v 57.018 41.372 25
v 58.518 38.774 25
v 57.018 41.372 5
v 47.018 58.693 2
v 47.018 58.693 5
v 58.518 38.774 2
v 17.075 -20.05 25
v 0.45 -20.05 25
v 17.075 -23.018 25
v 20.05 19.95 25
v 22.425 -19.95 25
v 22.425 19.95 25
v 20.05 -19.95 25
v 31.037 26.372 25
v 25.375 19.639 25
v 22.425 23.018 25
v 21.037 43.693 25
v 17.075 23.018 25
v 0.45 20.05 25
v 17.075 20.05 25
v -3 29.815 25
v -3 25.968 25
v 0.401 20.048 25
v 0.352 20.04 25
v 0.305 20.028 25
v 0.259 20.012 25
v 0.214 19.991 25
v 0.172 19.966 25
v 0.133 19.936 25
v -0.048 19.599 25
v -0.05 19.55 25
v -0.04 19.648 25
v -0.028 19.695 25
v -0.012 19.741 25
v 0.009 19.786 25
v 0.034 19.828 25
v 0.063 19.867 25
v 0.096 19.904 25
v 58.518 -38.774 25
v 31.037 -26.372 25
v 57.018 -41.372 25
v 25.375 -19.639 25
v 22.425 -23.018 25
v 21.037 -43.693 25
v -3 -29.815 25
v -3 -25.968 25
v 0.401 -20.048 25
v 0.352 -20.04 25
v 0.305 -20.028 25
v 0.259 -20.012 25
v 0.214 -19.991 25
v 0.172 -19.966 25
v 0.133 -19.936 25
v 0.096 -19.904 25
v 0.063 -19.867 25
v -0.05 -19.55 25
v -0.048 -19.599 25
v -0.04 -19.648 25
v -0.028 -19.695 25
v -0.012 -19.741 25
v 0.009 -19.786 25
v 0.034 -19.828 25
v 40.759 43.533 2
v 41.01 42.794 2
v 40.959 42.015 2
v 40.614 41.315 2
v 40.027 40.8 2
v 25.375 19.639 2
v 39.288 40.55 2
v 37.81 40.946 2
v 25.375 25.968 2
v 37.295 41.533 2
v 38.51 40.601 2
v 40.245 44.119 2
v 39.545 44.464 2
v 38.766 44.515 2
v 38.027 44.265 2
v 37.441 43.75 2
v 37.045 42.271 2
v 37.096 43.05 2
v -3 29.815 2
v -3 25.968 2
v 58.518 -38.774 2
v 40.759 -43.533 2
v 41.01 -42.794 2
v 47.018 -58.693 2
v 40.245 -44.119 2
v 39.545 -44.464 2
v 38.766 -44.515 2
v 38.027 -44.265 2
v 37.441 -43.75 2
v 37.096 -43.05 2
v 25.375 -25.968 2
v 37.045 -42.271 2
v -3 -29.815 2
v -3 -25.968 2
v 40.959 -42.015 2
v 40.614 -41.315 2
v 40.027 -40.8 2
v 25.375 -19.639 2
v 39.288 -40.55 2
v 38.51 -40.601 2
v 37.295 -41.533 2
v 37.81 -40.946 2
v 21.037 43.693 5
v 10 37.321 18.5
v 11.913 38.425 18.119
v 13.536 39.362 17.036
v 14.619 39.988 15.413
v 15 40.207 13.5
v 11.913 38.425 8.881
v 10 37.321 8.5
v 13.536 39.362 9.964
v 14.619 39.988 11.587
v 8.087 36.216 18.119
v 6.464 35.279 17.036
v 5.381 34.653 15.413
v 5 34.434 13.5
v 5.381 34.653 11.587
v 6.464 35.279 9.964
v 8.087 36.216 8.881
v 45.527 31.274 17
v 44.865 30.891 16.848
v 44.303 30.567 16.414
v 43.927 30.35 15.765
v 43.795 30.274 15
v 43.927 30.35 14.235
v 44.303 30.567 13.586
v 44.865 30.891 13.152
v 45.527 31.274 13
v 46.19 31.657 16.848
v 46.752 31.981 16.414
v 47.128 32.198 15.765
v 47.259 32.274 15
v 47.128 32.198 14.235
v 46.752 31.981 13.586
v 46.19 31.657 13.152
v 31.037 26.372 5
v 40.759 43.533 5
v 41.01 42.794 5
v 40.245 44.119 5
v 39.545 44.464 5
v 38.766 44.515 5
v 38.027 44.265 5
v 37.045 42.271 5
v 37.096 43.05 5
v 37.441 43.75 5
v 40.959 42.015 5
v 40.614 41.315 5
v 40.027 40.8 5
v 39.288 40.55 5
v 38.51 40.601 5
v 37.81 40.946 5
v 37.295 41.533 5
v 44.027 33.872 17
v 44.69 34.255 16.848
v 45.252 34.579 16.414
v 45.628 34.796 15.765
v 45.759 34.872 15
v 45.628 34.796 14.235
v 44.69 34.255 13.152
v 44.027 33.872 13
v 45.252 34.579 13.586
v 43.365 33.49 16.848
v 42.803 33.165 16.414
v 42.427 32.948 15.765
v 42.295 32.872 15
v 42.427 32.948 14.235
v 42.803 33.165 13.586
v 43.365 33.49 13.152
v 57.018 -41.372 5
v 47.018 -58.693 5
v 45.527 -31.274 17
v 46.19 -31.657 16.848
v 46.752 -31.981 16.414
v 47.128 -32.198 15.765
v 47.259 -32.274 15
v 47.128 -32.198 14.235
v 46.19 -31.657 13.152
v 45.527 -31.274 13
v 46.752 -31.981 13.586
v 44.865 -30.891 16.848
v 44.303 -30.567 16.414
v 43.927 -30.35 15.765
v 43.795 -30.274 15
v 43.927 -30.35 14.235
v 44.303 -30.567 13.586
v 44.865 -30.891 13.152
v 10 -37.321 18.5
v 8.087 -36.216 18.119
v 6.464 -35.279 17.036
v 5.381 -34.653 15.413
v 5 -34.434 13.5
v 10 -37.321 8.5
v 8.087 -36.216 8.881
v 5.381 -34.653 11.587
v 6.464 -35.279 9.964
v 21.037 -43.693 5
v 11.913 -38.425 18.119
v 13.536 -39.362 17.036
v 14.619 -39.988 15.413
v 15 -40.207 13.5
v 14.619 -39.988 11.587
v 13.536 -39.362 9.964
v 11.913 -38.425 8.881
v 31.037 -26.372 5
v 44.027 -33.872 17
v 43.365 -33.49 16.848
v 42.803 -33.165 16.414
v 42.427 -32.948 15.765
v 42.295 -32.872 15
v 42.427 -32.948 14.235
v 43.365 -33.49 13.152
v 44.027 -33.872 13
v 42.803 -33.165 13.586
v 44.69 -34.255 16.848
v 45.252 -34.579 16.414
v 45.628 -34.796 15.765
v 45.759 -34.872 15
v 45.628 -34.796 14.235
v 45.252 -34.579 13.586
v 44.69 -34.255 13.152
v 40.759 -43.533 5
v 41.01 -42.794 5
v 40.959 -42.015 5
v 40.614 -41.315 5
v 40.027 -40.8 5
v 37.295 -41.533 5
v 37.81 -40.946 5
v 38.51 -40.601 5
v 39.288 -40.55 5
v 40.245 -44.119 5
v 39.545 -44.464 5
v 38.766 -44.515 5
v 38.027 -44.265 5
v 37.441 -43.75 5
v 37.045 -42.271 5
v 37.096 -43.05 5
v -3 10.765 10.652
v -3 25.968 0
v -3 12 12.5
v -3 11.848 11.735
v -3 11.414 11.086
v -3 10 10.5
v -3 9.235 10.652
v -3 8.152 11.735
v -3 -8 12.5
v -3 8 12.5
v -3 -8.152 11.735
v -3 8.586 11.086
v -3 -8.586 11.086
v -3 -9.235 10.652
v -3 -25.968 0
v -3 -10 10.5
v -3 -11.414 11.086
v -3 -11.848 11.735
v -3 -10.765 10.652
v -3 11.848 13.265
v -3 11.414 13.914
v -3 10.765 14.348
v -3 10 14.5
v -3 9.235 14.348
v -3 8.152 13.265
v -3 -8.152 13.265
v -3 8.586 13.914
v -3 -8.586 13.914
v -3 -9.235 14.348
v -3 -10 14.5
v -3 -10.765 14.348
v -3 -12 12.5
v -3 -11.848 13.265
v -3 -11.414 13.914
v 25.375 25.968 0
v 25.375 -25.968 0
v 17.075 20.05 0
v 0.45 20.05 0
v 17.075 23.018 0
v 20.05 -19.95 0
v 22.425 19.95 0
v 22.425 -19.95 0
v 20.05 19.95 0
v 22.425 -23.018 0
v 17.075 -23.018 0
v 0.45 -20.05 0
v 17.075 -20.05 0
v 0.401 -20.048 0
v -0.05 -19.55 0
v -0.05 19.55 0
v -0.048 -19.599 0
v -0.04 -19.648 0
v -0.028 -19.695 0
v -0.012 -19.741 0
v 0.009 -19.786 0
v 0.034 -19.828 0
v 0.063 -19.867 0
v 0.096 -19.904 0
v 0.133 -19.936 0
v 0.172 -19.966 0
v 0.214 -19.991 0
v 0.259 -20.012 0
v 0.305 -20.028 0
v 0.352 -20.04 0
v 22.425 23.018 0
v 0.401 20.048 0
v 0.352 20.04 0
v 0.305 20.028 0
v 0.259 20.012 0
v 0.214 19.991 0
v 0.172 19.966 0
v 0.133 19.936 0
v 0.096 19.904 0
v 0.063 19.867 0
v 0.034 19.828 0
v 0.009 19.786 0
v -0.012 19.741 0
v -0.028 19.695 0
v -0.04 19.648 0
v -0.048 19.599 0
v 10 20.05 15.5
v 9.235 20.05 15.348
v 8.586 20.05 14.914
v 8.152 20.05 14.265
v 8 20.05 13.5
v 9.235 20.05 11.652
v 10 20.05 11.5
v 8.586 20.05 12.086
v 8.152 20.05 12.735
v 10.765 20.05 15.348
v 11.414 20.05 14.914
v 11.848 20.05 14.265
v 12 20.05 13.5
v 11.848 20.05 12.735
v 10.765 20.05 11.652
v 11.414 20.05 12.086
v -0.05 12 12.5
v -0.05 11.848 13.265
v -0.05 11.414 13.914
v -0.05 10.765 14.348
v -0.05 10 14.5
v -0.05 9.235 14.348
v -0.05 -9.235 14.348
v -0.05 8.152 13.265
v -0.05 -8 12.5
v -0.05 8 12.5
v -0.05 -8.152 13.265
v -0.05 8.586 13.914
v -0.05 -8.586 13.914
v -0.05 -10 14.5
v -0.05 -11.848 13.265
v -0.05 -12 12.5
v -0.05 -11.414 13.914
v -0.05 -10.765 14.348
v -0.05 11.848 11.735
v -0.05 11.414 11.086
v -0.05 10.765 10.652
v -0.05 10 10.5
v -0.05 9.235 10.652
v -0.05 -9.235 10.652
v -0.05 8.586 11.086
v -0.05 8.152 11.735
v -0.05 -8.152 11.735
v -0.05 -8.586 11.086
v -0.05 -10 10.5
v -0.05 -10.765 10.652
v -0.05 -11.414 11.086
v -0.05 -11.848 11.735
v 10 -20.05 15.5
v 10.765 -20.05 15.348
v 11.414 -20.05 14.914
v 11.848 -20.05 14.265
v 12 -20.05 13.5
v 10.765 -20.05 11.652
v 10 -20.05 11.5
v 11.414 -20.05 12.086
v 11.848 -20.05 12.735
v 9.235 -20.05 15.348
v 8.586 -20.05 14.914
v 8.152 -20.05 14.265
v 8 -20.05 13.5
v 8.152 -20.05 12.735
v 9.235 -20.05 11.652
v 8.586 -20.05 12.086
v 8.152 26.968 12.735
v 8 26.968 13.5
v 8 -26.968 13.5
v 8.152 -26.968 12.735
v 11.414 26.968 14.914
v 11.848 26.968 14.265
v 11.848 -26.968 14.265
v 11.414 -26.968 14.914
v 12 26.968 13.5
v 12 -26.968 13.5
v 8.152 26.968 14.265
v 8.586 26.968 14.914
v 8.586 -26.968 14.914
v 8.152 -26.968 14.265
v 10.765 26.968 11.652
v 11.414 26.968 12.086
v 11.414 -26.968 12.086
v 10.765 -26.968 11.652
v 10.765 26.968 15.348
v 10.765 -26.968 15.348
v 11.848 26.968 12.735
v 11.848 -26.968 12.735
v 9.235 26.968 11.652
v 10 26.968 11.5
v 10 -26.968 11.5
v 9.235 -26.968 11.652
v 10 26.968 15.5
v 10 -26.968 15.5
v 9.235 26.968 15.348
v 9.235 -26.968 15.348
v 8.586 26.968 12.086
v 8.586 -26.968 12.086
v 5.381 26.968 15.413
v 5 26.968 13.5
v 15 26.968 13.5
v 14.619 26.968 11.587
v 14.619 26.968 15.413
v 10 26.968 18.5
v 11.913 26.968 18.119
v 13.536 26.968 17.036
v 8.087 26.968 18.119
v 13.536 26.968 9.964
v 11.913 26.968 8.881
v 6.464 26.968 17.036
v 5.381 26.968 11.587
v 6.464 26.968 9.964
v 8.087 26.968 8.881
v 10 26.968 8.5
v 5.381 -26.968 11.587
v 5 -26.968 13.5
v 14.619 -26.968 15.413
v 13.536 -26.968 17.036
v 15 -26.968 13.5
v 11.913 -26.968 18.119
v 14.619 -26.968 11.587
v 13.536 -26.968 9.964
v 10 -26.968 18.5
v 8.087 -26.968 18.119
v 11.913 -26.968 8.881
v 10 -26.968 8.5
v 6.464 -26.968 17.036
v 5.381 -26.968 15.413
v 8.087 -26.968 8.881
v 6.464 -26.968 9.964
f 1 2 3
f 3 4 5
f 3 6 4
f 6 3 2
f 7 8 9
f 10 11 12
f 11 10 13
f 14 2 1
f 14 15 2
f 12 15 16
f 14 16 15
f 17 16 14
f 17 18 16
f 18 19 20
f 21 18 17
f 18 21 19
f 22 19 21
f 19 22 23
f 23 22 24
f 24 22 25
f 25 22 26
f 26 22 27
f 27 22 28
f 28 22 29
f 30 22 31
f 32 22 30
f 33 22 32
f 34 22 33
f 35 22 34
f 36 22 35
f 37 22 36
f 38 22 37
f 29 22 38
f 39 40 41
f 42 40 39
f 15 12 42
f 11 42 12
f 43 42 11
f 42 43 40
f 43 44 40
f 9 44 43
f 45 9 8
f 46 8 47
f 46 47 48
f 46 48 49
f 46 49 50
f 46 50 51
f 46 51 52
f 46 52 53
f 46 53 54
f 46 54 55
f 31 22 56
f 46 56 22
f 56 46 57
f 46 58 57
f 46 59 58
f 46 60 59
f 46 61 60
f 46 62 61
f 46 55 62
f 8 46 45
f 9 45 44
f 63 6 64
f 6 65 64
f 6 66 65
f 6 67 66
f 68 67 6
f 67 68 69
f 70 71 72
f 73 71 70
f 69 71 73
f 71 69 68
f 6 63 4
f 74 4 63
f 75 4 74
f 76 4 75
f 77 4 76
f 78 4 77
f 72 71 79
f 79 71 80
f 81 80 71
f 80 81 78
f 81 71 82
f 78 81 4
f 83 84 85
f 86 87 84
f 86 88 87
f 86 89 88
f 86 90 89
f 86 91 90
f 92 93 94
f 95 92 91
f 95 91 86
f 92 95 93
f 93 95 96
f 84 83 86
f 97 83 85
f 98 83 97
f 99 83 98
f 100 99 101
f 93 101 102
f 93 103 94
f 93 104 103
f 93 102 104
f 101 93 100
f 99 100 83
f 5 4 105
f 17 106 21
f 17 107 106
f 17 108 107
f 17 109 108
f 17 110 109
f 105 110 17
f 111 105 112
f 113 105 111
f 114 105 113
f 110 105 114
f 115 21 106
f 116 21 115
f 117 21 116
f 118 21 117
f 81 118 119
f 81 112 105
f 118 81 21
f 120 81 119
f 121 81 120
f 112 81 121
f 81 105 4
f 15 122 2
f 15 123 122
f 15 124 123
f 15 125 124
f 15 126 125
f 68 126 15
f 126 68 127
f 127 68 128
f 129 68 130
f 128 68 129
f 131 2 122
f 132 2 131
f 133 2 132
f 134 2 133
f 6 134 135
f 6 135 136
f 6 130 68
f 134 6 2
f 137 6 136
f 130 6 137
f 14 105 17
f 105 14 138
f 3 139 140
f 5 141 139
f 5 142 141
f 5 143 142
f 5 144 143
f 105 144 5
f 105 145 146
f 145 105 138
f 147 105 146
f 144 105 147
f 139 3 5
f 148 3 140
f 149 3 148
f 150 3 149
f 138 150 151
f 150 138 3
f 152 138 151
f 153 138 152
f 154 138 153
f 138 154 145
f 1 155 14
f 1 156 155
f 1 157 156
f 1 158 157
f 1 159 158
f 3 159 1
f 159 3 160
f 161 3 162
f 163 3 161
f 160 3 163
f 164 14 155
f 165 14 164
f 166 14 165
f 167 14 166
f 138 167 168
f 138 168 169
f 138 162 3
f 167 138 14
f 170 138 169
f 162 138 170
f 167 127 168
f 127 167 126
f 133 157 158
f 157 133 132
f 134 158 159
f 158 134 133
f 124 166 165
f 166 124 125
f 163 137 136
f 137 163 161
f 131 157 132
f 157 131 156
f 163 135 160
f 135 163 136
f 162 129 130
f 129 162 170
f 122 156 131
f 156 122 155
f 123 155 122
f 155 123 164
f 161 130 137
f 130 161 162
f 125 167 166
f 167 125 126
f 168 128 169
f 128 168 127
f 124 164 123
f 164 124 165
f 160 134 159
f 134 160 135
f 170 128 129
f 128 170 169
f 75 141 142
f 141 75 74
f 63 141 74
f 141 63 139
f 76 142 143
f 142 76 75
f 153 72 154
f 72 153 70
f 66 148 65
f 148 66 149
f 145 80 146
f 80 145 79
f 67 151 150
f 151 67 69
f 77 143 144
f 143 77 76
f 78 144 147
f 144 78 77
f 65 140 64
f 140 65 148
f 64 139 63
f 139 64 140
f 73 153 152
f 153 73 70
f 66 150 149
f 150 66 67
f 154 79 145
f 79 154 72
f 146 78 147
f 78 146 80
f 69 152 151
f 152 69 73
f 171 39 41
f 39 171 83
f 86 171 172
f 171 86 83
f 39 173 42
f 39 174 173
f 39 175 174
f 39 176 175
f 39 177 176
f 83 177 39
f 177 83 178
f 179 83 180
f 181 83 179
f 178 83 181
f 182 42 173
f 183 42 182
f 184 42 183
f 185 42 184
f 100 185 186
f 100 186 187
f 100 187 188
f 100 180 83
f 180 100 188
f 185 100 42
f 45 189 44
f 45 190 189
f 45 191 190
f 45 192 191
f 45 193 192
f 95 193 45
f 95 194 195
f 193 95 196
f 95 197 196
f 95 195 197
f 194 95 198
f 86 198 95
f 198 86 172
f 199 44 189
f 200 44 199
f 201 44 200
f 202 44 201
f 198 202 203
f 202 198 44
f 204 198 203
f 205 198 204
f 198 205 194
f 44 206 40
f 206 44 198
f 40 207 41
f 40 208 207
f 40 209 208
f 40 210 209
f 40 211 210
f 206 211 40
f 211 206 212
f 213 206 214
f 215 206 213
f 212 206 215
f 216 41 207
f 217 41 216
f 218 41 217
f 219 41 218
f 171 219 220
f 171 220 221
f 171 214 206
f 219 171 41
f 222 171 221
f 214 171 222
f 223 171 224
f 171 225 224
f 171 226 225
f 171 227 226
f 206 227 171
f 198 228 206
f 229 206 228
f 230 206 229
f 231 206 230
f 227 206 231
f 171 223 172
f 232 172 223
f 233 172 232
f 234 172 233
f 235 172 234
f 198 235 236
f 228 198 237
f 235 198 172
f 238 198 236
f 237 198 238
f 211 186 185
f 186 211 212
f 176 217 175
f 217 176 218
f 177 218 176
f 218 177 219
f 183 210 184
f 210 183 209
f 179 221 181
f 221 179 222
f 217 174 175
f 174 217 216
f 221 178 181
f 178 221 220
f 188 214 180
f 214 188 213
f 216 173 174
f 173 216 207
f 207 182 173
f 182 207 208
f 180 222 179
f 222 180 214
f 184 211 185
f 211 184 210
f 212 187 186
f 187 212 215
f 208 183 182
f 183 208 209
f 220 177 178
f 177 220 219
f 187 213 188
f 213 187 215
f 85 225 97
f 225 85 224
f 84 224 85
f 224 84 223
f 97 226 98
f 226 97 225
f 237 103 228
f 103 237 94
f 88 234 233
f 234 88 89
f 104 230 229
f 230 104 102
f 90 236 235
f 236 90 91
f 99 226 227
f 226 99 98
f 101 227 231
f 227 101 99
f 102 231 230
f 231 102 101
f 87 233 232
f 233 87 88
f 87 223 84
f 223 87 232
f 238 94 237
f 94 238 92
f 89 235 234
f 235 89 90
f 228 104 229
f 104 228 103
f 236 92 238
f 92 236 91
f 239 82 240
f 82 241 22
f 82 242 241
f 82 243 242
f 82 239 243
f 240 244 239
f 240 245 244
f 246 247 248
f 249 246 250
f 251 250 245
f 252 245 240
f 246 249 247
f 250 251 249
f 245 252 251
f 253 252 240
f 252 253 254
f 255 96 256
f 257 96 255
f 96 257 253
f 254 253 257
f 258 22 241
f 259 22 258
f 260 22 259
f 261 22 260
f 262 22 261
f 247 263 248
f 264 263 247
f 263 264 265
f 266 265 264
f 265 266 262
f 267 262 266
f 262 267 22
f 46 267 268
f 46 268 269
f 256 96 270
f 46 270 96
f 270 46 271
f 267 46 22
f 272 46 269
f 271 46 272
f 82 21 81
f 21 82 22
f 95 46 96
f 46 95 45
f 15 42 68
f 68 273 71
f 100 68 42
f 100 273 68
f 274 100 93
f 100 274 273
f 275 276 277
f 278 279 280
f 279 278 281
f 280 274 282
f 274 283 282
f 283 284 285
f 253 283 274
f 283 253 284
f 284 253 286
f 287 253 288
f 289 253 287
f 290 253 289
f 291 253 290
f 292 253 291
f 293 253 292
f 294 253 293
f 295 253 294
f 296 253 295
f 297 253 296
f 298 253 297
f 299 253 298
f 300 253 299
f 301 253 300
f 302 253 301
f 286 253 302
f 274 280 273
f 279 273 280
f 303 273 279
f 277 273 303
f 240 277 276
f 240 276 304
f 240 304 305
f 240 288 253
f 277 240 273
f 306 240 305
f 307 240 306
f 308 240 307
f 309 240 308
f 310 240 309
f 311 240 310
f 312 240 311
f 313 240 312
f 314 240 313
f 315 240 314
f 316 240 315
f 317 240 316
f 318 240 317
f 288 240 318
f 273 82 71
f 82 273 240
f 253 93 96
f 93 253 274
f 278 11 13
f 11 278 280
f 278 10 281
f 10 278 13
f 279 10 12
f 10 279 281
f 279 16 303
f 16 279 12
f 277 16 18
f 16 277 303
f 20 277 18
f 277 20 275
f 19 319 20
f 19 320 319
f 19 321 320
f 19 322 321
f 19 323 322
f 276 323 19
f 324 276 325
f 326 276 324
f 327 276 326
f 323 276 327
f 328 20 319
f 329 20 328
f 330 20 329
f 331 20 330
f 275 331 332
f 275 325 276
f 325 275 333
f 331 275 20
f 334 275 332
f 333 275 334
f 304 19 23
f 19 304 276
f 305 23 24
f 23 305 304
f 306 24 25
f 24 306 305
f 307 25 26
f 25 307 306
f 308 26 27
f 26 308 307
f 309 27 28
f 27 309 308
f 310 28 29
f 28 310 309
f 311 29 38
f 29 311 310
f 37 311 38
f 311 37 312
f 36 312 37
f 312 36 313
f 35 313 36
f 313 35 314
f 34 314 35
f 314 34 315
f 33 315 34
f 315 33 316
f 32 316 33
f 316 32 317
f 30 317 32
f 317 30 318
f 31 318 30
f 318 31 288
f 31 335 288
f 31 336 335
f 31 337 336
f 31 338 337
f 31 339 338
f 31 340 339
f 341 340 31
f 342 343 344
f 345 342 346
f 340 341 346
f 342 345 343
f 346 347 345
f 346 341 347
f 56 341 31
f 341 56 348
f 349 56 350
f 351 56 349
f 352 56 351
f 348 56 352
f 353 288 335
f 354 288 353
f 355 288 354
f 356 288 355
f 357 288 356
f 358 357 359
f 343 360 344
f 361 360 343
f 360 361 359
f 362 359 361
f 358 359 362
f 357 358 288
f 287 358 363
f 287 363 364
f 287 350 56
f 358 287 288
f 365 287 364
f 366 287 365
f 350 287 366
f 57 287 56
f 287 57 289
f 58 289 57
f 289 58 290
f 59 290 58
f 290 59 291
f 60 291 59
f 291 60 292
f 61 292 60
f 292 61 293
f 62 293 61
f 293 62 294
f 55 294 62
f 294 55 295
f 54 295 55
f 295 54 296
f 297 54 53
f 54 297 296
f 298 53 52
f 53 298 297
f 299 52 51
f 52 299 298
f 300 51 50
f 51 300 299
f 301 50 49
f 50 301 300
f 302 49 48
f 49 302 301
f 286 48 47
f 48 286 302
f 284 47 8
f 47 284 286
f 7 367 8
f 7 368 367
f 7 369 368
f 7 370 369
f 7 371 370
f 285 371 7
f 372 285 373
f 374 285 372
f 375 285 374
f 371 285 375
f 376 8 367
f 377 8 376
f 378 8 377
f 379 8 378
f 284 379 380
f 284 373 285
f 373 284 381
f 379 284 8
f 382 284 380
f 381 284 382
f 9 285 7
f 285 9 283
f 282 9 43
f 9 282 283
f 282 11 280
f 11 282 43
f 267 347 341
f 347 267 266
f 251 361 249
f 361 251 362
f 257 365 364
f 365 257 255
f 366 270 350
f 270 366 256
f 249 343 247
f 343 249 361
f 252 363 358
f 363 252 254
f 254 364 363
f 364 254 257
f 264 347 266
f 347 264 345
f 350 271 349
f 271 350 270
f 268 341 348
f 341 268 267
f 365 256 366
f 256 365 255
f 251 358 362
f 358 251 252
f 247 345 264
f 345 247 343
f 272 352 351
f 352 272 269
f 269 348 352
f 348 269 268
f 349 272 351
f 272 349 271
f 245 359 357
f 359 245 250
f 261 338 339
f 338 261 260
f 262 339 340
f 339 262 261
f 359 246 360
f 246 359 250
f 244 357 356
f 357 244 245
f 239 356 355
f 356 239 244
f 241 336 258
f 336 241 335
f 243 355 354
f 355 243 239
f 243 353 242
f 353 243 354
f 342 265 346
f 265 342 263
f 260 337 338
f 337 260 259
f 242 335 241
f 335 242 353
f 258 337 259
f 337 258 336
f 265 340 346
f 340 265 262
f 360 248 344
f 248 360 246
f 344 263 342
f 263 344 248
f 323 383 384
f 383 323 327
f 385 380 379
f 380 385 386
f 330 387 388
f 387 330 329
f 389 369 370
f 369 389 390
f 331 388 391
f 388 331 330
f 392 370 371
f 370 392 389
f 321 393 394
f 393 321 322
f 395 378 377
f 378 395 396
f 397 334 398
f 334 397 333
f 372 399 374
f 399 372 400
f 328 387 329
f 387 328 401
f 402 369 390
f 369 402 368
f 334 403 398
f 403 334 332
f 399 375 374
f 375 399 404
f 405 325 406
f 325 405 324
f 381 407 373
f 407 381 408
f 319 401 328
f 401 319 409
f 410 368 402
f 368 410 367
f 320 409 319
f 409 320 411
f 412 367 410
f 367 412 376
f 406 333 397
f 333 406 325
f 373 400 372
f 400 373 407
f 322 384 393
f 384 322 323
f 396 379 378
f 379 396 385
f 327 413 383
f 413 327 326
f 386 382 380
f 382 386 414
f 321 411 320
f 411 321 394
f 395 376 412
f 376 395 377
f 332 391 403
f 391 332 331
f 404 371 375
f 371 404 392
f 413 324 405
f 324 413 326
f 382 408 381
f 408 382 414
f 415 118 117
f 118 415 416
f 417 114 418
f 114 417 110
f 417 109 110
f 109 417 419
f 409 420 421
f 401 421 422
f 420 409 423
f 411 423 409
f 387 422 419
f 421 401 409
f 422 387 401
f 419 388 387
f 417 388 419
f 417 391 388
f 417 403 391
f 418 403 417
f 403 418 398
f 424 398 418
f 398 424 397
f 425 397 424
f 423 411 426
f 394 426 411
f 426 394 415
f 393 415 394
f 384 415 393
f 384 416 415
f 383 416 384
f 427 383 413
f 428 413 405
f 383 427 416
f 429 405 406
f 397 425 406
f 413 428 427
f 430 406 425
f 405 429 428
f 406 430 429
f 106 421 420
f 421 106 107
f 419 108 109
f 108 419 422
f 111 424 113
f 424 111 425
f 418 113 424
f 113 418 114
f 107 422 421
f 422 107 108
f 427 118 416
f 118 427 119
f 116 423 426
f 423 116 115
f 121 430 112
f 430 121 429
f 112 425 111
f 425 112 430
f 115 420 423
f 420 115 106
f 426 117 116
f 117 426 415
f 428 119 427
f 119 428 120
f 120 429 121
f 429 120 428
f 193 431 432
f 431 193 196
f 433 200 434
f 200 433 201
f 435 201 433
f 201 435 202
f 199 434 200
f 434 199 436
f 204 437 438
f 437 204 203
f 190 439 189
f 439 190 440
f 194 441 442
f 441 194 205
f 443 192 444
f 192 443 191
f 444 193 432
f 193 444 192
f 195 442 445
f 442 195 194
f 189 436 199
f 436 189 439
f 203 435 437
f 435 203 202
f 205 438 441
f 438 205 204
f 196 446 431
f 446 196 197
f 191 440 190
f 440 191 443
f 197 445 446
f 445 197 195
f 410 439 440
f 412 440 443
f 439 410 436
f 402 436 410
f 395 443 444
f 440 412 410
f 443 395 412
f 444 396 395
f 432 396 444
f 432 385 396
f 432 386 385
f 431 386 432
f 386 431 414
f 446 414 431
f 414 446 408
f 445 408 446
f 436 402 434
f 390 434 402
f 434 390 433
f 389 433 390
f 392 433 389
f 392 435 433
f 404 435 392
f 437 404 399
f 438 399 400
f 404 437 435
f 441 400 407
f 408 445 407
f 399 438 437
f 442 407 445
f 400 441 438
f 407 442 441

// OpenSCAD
// file: ../../conf/printer_config.scad
/**********************************************************************************************************************
 **
 ** conf/printer_config.scad
 **
 ** This file contains the main control variables that determine the size and shape of the printer. Note that in the
 ** actual parts specifications, the constants defined here will only ever be accessed through functions defined in
 ** conf/derived_sizes.scad exclusively to allow for easier adaptation, should the mode of calculation change. 
 **
 ** All sizes in mm. Caution: Little to no cross-checking is implemented. Change values sensibly and one at a time.
 **
 ** This file is NOT to be included by any other file except for conf/derived_sizes.scad.
 **
 **********************************************************************************************************************/

include <constants.scad>

// ===== PRINTER CONFIGURATION ========================================================================================

// The length of the vertical MakerSlide extrusions that make up the rails for the carriages.
FRAME_V_RAIL_HEIGHT = 800;

// The length of the horizontal 20x20 V-Slot extrusions that form the sides of the triangle.
FRAME_H_RAIL_LENGTH = 400;

// ===== FABRICATED PART DIMENSIONS ===================================================================================

// The additional clearance to leave around the MakerSlide extrusion.
MAKERSLIDE_CLEARANCE = 0.05;

// The thickness of the walls outside the extruded parts.
FRAME_PART_WALL_THICKNESS = 3;

// The thickness of the wall that separates the vertical rails from the horizontal extrusions.
FRAME_V_H_RAIL_SEPARATION = 8;

// The depth of the holes that hold the V-Slot extrusions.
FRAME_PART_VSLOT_DEPTH = 30;

// Whether to use a horizontal rail at the base of the printer or not.
FRAME_HORIZONTAL_BASE_RAIL = false;

// The depth of the holes in the foot that hold the MakerSlide extrusions. This is for the foot version that holds
// a horizontal rail.
FRAME_FOOT_RAIL_MAKERSLIDE_DEPTH = 25; 

// The depth of the holes in the foot that hold the MakerSlide extrusions. This is for the foot version that does not
// hold a horizontal rail.
FRAME_FOOT_NORAIL_MAKERSLIDE_DEPTH = 17.5; 

// The size of the screws that can be used to mount the foot to the underlying surface.
FRAME_FOOT_BOTTOM_SCREW_SIZE = M5;

// The height of the bracket that holds the motor. WARNING: Increasing this might make it difficult to 
// turn the screws that hold the motor.
FRAME_MOTOR_BRACKET_HEIGHT = 25;

// The height of the bracket that holds the intermediate level with the working surface (print bed).
FRAME_BED_BRACKET_HEIGHT = 25; 

// The depth of the holes in the head that hold the MakerSlide extrusions.
FRAME_HEAD_MAKERSLIDE_DEPTH = 35; 

// The thickness of the carriage base plate. A thicker plate will make the carriage stiffer, but cost more
// material to print and take away space from the working area.
CARRIAGE_PLATE_THICKNESS = 6;

// The width of the border around the holes in the carriage base plate that hold the V-Wheels. 
CARRIAGE_PLATE_BORDER_WIDTH = 8;

// The range by which the vertical belt tensioner can be adjusted.
TENSIONER_RANGE = 15;

// The distance between the rods that hold the effector.
ROD_DISTANCE = 65;

// The outer diameter of the rods.
ROD_OUTER_DIAMETER = 6;

// The inner diameter of the rods. Set to 0 if the rods are not hollow.
ROD_INNER_DIAMETER = 4;

// The additional clearance to leave between the rod and the holder.
ROD_CLEARANCE = 0.05;

// The thickness of the outer wall around the rod.
ROD_HOLDER_WALL_THICKNESS = 2;

// The depth of the insets that hold the rods.
ROD_HOLDER_DEPTH = 10;

// The minimum angle of the arms.
ROD_MIN_ANGLE = 18;

// The factor used to round up the rod length.
ROD_ROUND_UP_TO = 5;

// The thickness of the magnet holder arms.
MAGNET_HOLDER_THICKNESS = 5;

// The additional clearance to leave around the magnet holder pin.
MAGNET_CLEARANCE = 0.025;

// The upward angle of the ball holder on the carriage.
CARRIAGE_BALL_HOLDER_ANGLE = 10;

// The additional distance between the magnets on the effector (not the rod distance - the other one :-)).
// This value is added to the minimum distance determined by the magnet size and wall thickness.
EFFECTOR_BALL_ADDITIONAL_DISTANCE = 15;

// The thickness of the effector plate.
EFFECTOR_THICKNESS = 6;

// The thickness of the plate that serves as the heated bed.
BED_THICKNESS = 4;

// The diameter of the plate that serves as the heated bed.
BED_DIAMETER = 300;
// file: ../../conf/constants.scad
/**********************************************************************************************************************
 **
 ** conf/constants.scad
 **
 ** This file contains constants and aliases used for the part size definitions.
 **
 **********************************************************************************************************************/

/**
 * The alias names for the rails.
 * A is the "front left" rail, B the "front right" rail, C the back rail.
 * These constants are also used for the sides of the frame and the effector; in this case, side A is the one 
 * opposing rail A.
 */
A = 0;
B = 1;
C = 2;

/**
 * Aliases for metric screw/nut sizes.
 */
M2 = 2;
M3 = 3;
M4 = 4;
M5 = 5;

/** 
 * Aliases for NEMA stepper motors.
 */
NEMA14 = 14;
NEMA17 = 17;
NEMA23 = 23;
// file: ../extrusions/vslot_2020.scad
/**********************************************************************************************************************
 **
 ** parts/extrusions/vslot_2020.scad
 **
 ** This file ontains some general functions that provide the dimensions of the profile as well as the modules used 
 ** to import the rendered rails. 
 ** This file is intended to be included by other files down the line.
 **
 **********************************************************************************************************************/

include <../../conf/colors.scad>
include <../../conf/derived_sizes.scad>
include <../../conf/part_sizes.scad>

use <../../bom/bom.scad>

/**
 * Provides the pre-rendered horizontal side piece.
 * The extrusion will lie horizontally along the positive X axis and will extend into positve Y and Z.
 */
module vslot_2020_side() {
	bom_entry(section = "Aluminium Extrusions", description = "V-Slot Extrusion", size = str(horizontal_extrusion_length(), "x20x20 mm"));
	color_extrusion()
		import(file = "vslot_2020_side.stl"); 
}

/**
 * Create an object that resembles the outer shell of a V-Slot 20x20 mm extrusion. Usage is similar
 * to vslot_extrusion(length). This is handy to punch a hole into a printed part that will later
 * accomodate the V-Slot 20x20 mm extrusion.
 */
module vslot_2020_punch(length, rounded = false) {
	color_punch()
		linear_extrude(height = length, center = false, convexity = 10)
			if (rounded) {
				hull($fn = vslot_2020_edge_resolution()) {
					translate([vslot_2020_edge_radius(), vslot_2020_edge_radius(), 0])
						circle(r = vslot_2020_edge_radius());
					translate([vslot_2020_depth() - vslot_2020_edge_radius(), vslot_2020_edge_radius(), 0])
						circle(r = vslot_2020_edge_radius());
					translate([vslot_2020_edge_radius(), 18.5, 0])
						circle(r = vslot_2020_edge_radius());
					translate([vslot_2020_depth() - vslot_2020_edge_radius(), vslot_2020_width() - vslot_2020_edge_radius(), 0])
						circle(r = vslot_2020_edge_radius());
				}
			} else {
				square([vslot_2020_depth(), vslot_2020_width()]);
			}
}
// file: ../extrusions/makerslide.scad
/**********************************************************************************************************************
 **
 ** parts/extrusions/makerslide.scad
 **
 ** This file ontains some general functions that provide the dimensions of the profile as well as the modules used 
 ** to import the rendered rails. 
 ** This file is intended to be included by other files down the line.
 **
 **********************************************************************************************************************/

include <../../conf/colors.scad>
include <../../conf/derived_sizes.scad>
include <../../conf/part_sizes.scad>

use <../../bom/bom.scad>

/**
 * Provides the pre-rendered main vertical rail.
 * The extrusion will reach into positive X and Z space while being centered on the Y axis.
 */
module makerslide_vertical_rail() {
	bom_entry(section = "Aluminium Extrusions", 
		      description = "MakerSlide Extrusion", 
		      size = str(vertical_extrusion_length(), " mm"));
	color_extrusion()
		import(file = "makerslide_rail.stl"); 
}

/**
 * Create an object that resembles the outer shell of a MakerSlide extrusion. Usage is similar
 * to makerslide_vertical_rail(length). This is handy to punch a hole into a printed part that will later
 * accomodate the MakerSlide extrusion.
 */
module makerslide_punch(length) {
	color_punch()
		linear_extrude(height = length, center = false, convexity = 10)
			union() {
				hull() {
					// use two circles for the back sides
					_y_offset = makerslide_base_width()/2 - makerslide_edge_radius() + makerslide_clearance();
					translate([makerslide_edge_radius() - makerslide_clearance(), -_y_offset, 0])
						circle(r = makerslide_edge_radius(), $fn = makerslide_edge_resolution());
					translate([makerslide_edge_radius() - makerslide_clearance(), _y_offset, 0])
						circle(r = makerslide_edge_radius(), $fn = makerslide_edge_resolution());
					// use a rectangle to shape the front side
					translate([makerslide_base_depth() - 1 + makerslide_clearance(), 
						       -makerslide_base_width()/2 - makerslide_clearance(), 0])
						square([1, makerslide_base_width() + 2 * makerslide_clearance()]);
				}
				_rail_base_x = makerslide_base_depth() - makerslide_edge_radius() - 
				               makerslide_rail_depth() - makerslide_clearance();
				_rail_offset_y = makerslide_base_width()/2 - makerslide_clearance();
				_rail_punch_width = makerslide_rail_width() + 2 * makerslide_clearance();
				_rail_punch_depth = 2*makerslide_rail_depth() + makerslide_edge_radius() + 2 * makerslide_clearance();
				translate([_rail_base_x, -_rail_offset_y - _rail_punch_width, 0])
					square([_rail_punch_depth, _rail_punch_width]);
				translate([_rail_base_x, _rail_offset_y, 0])
					square([_rail_punch_depth, _rail_punch_width]);

				// previous version:
				// // use the profile itself as the basic shape
				// import(file = "makerslide.dxf"); 
				// // add a rectangle to fill the holes on the left/right (small) sides 
				// // as well as most of the inside of the profile
				// translate([2, -20, 0])
				// 	square([18, 40]);
				// // add a second rectangle to fill the gaps on the back (we want to keep the rounded edges)
				// translate([0, -18, 0])
				// 	square([2, 36]);
				
			}
}
// file: ../../bom/bom.scad
/**********************************************************************************************************************
 **
 ** bom/bom.scad
 **
 ** This file provides the functions to generate a basic bill of materials (BOM) from the model.
 **
 **********************************************************************************************************************/

/**
 * A recursive function to format the parent module hierarchy as a series of delimited sub-strings.
 * Example: "vertical_axis_assembly>_vertical_axis_assembly>makerslide_vertical_rail"
 */
function _bom_parent_list(level, delimiter = ">") = 
	(level < $parent_modules - 1) ? str(_bom_parent_list(level = level + 1), delimiter, parent_module(level)) : "";

module bom_entry(section = "", description = "", size = "", number = 1) {
	// Only perform any actions if WRITE_BOM is set. This is done through the command line - see Makefile.
	if (WRITE_BOM) {
		echo(str("BOM;", section, ";", description, ";", size, ";", number, ";", _bom_parent_list(level = 2)));
	}
}
// file: ../../conf/colors.scad
/**********************************************************************************************************************
 **
 ** conf/colors.scad
 **
 ** This file defines some modules to use symbolic colors throughout the entire project.
 **
 **********************************************************************************************************************/

/**
 * The color of the aluminium extrusions.
 */
module color_extrusion() {
	color("LightGrey")
		children();
} 

/**
 * The color of the cast aluminium parts.
 */
module color_cast_aluminium() {
	color("Silver")
		children();
} 

/**
 * The color of the "outer" printed frame elements.
 */
module color_printed_outer_frame() {
	color("RoyalBlue")
		children();
} 

/**
 * The color of the "inner" printed frame elements.
 */
module color_printed_inner_frame() {
	color("DodgerBlue")
		children();
} 

/**
 * The color of the printed carriages.
 */
module color_printed_carriage() {
	color("DodgerBlue")
		children();
} 

/**
 * The color of the printed tensioners and end switch brackets.
 */
module color_printed_head_parts() {
	color("PowderBlue")
		children();
} 

/**
 * The color of the magnet holders.
 */
module color_printed_magnet_holders() {
	color("RoyalBlue")
		children();
} 

/**
 * The color of the printed effectors.
 */
module color_printed_effector() {
	color("DodgerBlue")
		children();
} 

/**
 * The color of the stock hardware parts like nuts, bolts and screws.
 */
module color_hardware() {
	color("DarkSlateGray")
		children();
} 

/**
 * The color of the magnets and steel balls.
 */
module color_magnets_balls() {
	color("Silver")
		children();
} 

/**
 * The color of the gears and ball bearings.
 */
module color_gears() {
	color("Gray")
		children();
} 

/**
 * The color of the belts.
 */
module color_belt() {
	color("SaddleBrown")
		children();
} 

/**
 * The color of the stepper motors.
 */
module color_motor() {
	color("DimGray")
		children();
} 

/**
 * The color of the end switches.
 */
module color_switch() {
	color([0.15, 0.15, 0.15])
		children();
} 

/**
 * The color of the V-Wheels.
 */
module color_vwheels() {
	color([0.075, 0.075, 0.075])
		children();
} 

/**
 * The color of the carbon fiber rods for the arms.
 */
module color_rod() {
	color([0.2, 0.2, 0.2])
		children();
} 

/**
 * The color of punches and other objects that are usually not intended to be rendered as such, but rather to be
 * used as subtractive objects.
 */
module color_punch() {
	color("Red")
		children();
} 
// main file
/**********************************************************************************************************************
 **
 ** parts/printed/bed_bracket.scad
 **
 ** This file constructs the bed_bracket of the printer frame. To assemble the printer, you need three of these parts.
 **
 **********************************************************************************************************************/

include <../../conf/colors.scad>
include <../../conf/derived_sizes.scad>
include <../../conf/part_sizes.scad>

use <../../bom/bom.scad>
use <../../parts/extrusions/makerslide.scad>
use <../../parts/extrusions/vslot_2020.scad>
use <../../parts/vitamins/vitamins.scad>

// The dimensions of the horizontal parts that hold the V-Slot extrusions.
function _bed_bracket_horizontal_height() = vslot_2020_depth() + frame_wall_thickness();
function _bed_bracket_horizontal_width()  = vslot_2020_width() + frame_wall_thickness();
function _bed_bracket_horizontal_depth()  = horizontal_extrusion_offset() + horizontal_recess_depth();
function _bed_bracket_horizontal_left_y_offset() = -frame_wall_thickness() + horizontal_extrusion_outward_offset();
function _bed_bracket_horizontal_right_y_offset() = -_bed_bracket_horizontal_width() - horizontal_extrusion_outward_offset() + frame_wall_thickness();
function _bed_bracket_horizontal_z_offset()  = bed_bracket_height() - frame_wall_thickness() - vslot_2020_width();

// The dimensions of the vertical part that holds the MakerSlide extrusion.
function _bed_bracket_vertical_height() = bed_bracket_height();
function _bed_bracket_vertical_width()  = frame_wall_thickness() + makerslide_width() + frame_wall_thickness();
function _bed_bracket_vertical_depth()  = frame_wall_thickness() + makerslide_depth() + frame_wall_thickness();
function _bed_bracket_vertical_back_screw_height() = bed_bracket_height()/2;
function _bed_bracket_vertical_side_screw_height() = _bed_bracket_vertical_height() - _bed_bracket_horizontal_height()/2; // align with other screw
function _bed_bracket_vertical_side_screw_y_offset() = _bed_bracket_vertical_width()/2 + 1;

/**
 * Auxiliary module that creates one of the vertical legs. Not to be used outside of this file.
 */
module _bed_bracket_horizontal_leg(right = false) { 
	difference() {
		// the basic shape of the leg
		cube([_bed_bracket_horizontal_depth(), _bed_bracket_horizontal_width(), _bed_bracket_horizontal_height()]);
		// minus the recess for the horizontal extrusion
		translate([horizontal_extrusion_offset(), 
			       right ? 0 : frame_wall_thickness(), 
			       vslot_2020_depth() + frame_wall_thickness()])
			rotate([0, 90, 0])
				vslot_2020_punch(horizontal_recess_depth());
		// minus the screw hole on the inside
		_screw_x = _bed_bracket_horizontal_depth()-horizontal_screw_distance();
		translate([_screw_x, _bed_bracket_horizontal_width()/2, vslot_2020_depth()/2 + frame_wall_thickness()])
			rotate([90, 0, 0])
				cylinder(d = frame_screw_size(), h = _bed_bracket_horizontal_width(), 
		                 center = true, $fn = frame_screw_hole_resolution());
		// minus the screw hole on the top side
		translate([_screw_x, 
			       vslot_2020_depth()/2 + (right ? 0 : frame_wall_thickness()), 
			       _bed_bracket_horizontal_height() - vslot_2020_depth() - frame_wall_thickness()])
				cylinder(d = frame_screw_size(), h = 2*frame_wall_thickness(), 
		                 center = true, $fn = frame_screw_hole_resolution());
	}
}

/**
 * Auxiliary module that creates the hardware for one of the vertical legs. Not to be used outside of this file.
 */
module _bed_bracket_horizontal_leg_hardware(right = false, side_screw = true, bottom_screw = false) { 
	_screw_x = _bed_bracket_horizontal_depth()-horizontal_screw_distance();

	if (side_screw) {
		// inner screw
		translate([_screw_x, 
			       right ? _bed_bracket_horizontal_width() + epsilon() + washer_thickness(M4) 
			             : -epsilon() - washer_thickness(M4), 
			       vslot_2020_depth()/2])
			rotate([0, 0, right ? -90 : 90]) {
				washer(M4);
			}
		translate([_screw_x, 
			       right ? _bed_bracket_horizontal_width() + epsilon() + washer_thickness(M4) + epsilon() 
			             : -epsilon() - washer_thickness(M4) - epsilon(), 
			       vslot_2020_depth()/2])
			rotate([0, 0, right ? -90 : 90]) {
				screw(size = M4, length = 8);
				nut_tslot(M4);
			}
	}

	if (bottom_screw) {
		// bottom screw
		translate([_screw_x, 
			       vslot_2020_depth()/2 + (right ? 0 : frame_wall_thickness()), 
			       _bed_bracket_horizontal_z_offset() - epsilon() - washer_thickness(M4) ])
			rotate([0, -90, 0]) {
				washer(size = M4);
			}
		translate([_screw_x, 
			       vslot_2020_depth()/2 + (right ? 0 : frame_wall_thickness()), 
			       _bed_bracket_horizontal_z_offset() - epsilon() - washer_thickness(M4) - epsilon()])
			rotate([0, -90, 0]) {
				screw(size = M4, length = 8);
				nut_tslot(M4);
			}
	}
}

/**
 * Creates the lower bed bracket assembly by rendering it from scratch. This module is not to be called externally, use 
 * bed_bracket() instead.
 */
module _render_bed_bracket() {
	color_printed_outer_frame()
		render() {
			difference() {
				union() {
					// add a block to hold the MakerSlide extrusion, but without the holes for now
					translate([-frame_wall_thickness(), -_bed_bracket_vertical_width()/2, 0])
						cube([_bed_bracket_vertical_depth(), _bed_bracket_vertical_width(), _bed_bracket_vertical_height()]);
					// add blocks to hold the V-Slot extrusions, restricted to the specified wall depth in negative Y
					difference() {
						union() {
							rotate([0, 0, 30])
								translate([0, _bed_bracket_horizontal_left_y_offset(), _bed_bracket_horizontal_z_offset()])
									_bed_bracket_horizontal_leg(right = false);
							rotate([0, 0, -30])
								translate([0, _bed_bracket_horizontal_right_y_offset(), _bed_bracket_horizontal_z_offset()])
									_bed_bracket_horizontal_leg(right = true);
						}
						translate([-vslot_2020_depth()-frame_wall_thickness(), -makerslide_width(), _bed_bracket_horizontal_z_offset()])
							cube([vslot_2020_depth(), 2*makerslide_width(), _bed_bracket_horizontal_height()]);
					}
				}

				// minus the hole for the MakerSlide extrusion
				makerslide_punch(bed_bracket_height());

				// minus the screw holes on the back
				translate([-frame_wall_thickness()/2, -makerslide_slot_offset(), _bed_bracket_vertical_back_screw_height()])
					rotate([0, 90, 0])
						cylinder(d = frame_screw_size(), h = 2*frame_wall_thickness(), 
								 center = true, $fn = frame_screw_hole_resolution());
				translate([-frame_wall_thickness()/2, makerslide_slot_offset(), _bed_bracket_vertical_back_screw_height()])
					rotate([0, 90, 0])
						cylinder(d = frame_screw_size(), h = 2*frame_wall_thickness(), 
								 center = true, $fn = frame_screw_hole_resolution());

				// minus the screw holes on the side
				translate([makerslide_slot_offset(), 0, _bed_bracket_vertical_side_screw_height()])
					rotate([90, 0, 0])
						cylinder(d = frame_screw_size(), h = 2*_bed_bracket_vertical_width(), 
								 center = true, $fn = frame_screw_hole_resolution());
						
				// minus an additional inset so that the side screws can rest on a perpendicular surface
				_inset_depth = 100;
				translate([makerslide_slot_offset(), _bed_bracket_vertical_side_screw_y_offset() + _inset_depth/2, _bed_bracket_vertical_side_screw_height()])
					rotate([90, 0, 0])
						cylinder(d = frame_screw_head_size(), h = _inset_depth, 
								 center = true, $fn = frame_screw_hole_resolution());
				translate([makerslide_slot_offset(), -_bed_bracket_vertical_side_screw_y_offset() - _inset_depth/2, _bed_bracket_vertical_side_screw_height()])
					rotate([90, 0, 0])
						cylinder(d = frame_screw_head_size(), h = _inset_depth, 
								 center = true, $fn = frame_screw_hole_resolution());				
			}
		} 
}

/**
 * Main module to use the pre-rendered lower bed bracket. The assembly is centered on the Z axis in Y direction for easier 
 * manipulation, similar to the MakerSlide extrusion. 
 */
module bed_bracket() {
	bom_entry(section = "Printed Parts", description = "Frame", size = "Bed Bracket");
	color_printed_outer_frame()
		import(file = "bed_bracket.stl");
}

/** 
 * Renders the hardware (nuts, bolts, screws) that are used to fixed the printed part to the surrounding parts.
 */
module bed_bracket_hardware(vertical_side_screws = true, vertical_back_screws = false, horizontal_side_screws = true, horizontal_bottom_screws = false) {

	if (vertical_back_screws) {
		// vertical MakerSlide rail -- back 
		translate([-frame_wall_thickness() - epsilon() - washer_thickness(M4), 
			       -makerslide_slot_offset(), 
			       _bed_bracket_vertical_back_screw_height()]) {
			washer(size = M4);
		}
		translate([-frame_wall_thickness() - epsilon() - washer_thickness(M4) - epsilon(), 
			       -makerslide_slot_offset(), 
			       _bed_bracket_vertical_back_screw_height()]) {
			screw(size = M4, length = 8);
			nut_tslot(M4);
		}
		translate([-frame_wall_thickness() - epsilon() - washer_thickness(M4),
		           makerslide_slot_offset(), 
		           _bed_bracket_vertical_back_screw_height()]) {
			washer(size = M4);
		}
		translate([-frame_wall_thickness() - epsilon() - washer_thickness(M4) - epsilon(),
		           makerslide_slot_offset(), 
		           _bed_bracket_vertical_back_screw_height()]) {
			screw(size = M4, length = 8);
			nut_tslot(M4);
		}
	}

	if (vertical_side_screws) {
		// vertical MakerSlide rail -- sides
		_side_screw_y = _bed_bracket_vertical_side_screw_y_offset() + epsilon();
		translate([makerslide_slot_offset(), 
			       _side_screw_y + washer_thickness(M4), 
			       _bed_bracket_vertical_side_screw_height()]) 
			rotate([0, 0, -90]) {
				washer(size = M4);
			}
		translate([makerslide_slot_offset(), 
			       _side_screw_y + washer_thickness(M4) + epsilon(), 
			       _bed_bracket_vertical_side_screw_height()]) 
			rotate([0, 0, -90]) {
				screw(size = M4, length = 12);
				nut_tslot(M4);
			}
		translate([makerslide_slot_offset(), 
			       -_side_screw_y - washer_thickness(M4) - epsilon(), 
			       _bed_bracket_vertical_side_screw_height()]) 
			rotate([0, 0, 90]) {
				screw(size = M4, length = 12);
				nut_tslot(M4);
			}
		translate([makerslide_slot_offset(), 
			       -_side_screw_y - washer_thickness(M4), 
			       _bed_bracket_vertical_side_screw_height()]) 
			rotate([0, 0, 90]) {
				washer(size = M4);
			}
	}

	// left horizontal leg
	rotate([0, 0, 30])
		translate([0, _bed_bracket_horizontal_left_y_offset(), 0])
			_bed_bracket_horizontal_leg_hardware(right = false, 
				                                 side_screw = horizontal_side_screws, 
				                                 bottom_screw = horizontal_bottom_screws);

	// right horizontal leg
	rotate([0, 0, -30])
		translate([0, _bed_bracket_horizontal_right_y_offset(), 0])
			_bed_bracket_horizontal_leg_hardware(right = true, 
				                                 side_screw = horizontal_side_screws, 
				                                 bottom_screw = horizontal_bottom_screws);

}

_render_bed_bracket();
